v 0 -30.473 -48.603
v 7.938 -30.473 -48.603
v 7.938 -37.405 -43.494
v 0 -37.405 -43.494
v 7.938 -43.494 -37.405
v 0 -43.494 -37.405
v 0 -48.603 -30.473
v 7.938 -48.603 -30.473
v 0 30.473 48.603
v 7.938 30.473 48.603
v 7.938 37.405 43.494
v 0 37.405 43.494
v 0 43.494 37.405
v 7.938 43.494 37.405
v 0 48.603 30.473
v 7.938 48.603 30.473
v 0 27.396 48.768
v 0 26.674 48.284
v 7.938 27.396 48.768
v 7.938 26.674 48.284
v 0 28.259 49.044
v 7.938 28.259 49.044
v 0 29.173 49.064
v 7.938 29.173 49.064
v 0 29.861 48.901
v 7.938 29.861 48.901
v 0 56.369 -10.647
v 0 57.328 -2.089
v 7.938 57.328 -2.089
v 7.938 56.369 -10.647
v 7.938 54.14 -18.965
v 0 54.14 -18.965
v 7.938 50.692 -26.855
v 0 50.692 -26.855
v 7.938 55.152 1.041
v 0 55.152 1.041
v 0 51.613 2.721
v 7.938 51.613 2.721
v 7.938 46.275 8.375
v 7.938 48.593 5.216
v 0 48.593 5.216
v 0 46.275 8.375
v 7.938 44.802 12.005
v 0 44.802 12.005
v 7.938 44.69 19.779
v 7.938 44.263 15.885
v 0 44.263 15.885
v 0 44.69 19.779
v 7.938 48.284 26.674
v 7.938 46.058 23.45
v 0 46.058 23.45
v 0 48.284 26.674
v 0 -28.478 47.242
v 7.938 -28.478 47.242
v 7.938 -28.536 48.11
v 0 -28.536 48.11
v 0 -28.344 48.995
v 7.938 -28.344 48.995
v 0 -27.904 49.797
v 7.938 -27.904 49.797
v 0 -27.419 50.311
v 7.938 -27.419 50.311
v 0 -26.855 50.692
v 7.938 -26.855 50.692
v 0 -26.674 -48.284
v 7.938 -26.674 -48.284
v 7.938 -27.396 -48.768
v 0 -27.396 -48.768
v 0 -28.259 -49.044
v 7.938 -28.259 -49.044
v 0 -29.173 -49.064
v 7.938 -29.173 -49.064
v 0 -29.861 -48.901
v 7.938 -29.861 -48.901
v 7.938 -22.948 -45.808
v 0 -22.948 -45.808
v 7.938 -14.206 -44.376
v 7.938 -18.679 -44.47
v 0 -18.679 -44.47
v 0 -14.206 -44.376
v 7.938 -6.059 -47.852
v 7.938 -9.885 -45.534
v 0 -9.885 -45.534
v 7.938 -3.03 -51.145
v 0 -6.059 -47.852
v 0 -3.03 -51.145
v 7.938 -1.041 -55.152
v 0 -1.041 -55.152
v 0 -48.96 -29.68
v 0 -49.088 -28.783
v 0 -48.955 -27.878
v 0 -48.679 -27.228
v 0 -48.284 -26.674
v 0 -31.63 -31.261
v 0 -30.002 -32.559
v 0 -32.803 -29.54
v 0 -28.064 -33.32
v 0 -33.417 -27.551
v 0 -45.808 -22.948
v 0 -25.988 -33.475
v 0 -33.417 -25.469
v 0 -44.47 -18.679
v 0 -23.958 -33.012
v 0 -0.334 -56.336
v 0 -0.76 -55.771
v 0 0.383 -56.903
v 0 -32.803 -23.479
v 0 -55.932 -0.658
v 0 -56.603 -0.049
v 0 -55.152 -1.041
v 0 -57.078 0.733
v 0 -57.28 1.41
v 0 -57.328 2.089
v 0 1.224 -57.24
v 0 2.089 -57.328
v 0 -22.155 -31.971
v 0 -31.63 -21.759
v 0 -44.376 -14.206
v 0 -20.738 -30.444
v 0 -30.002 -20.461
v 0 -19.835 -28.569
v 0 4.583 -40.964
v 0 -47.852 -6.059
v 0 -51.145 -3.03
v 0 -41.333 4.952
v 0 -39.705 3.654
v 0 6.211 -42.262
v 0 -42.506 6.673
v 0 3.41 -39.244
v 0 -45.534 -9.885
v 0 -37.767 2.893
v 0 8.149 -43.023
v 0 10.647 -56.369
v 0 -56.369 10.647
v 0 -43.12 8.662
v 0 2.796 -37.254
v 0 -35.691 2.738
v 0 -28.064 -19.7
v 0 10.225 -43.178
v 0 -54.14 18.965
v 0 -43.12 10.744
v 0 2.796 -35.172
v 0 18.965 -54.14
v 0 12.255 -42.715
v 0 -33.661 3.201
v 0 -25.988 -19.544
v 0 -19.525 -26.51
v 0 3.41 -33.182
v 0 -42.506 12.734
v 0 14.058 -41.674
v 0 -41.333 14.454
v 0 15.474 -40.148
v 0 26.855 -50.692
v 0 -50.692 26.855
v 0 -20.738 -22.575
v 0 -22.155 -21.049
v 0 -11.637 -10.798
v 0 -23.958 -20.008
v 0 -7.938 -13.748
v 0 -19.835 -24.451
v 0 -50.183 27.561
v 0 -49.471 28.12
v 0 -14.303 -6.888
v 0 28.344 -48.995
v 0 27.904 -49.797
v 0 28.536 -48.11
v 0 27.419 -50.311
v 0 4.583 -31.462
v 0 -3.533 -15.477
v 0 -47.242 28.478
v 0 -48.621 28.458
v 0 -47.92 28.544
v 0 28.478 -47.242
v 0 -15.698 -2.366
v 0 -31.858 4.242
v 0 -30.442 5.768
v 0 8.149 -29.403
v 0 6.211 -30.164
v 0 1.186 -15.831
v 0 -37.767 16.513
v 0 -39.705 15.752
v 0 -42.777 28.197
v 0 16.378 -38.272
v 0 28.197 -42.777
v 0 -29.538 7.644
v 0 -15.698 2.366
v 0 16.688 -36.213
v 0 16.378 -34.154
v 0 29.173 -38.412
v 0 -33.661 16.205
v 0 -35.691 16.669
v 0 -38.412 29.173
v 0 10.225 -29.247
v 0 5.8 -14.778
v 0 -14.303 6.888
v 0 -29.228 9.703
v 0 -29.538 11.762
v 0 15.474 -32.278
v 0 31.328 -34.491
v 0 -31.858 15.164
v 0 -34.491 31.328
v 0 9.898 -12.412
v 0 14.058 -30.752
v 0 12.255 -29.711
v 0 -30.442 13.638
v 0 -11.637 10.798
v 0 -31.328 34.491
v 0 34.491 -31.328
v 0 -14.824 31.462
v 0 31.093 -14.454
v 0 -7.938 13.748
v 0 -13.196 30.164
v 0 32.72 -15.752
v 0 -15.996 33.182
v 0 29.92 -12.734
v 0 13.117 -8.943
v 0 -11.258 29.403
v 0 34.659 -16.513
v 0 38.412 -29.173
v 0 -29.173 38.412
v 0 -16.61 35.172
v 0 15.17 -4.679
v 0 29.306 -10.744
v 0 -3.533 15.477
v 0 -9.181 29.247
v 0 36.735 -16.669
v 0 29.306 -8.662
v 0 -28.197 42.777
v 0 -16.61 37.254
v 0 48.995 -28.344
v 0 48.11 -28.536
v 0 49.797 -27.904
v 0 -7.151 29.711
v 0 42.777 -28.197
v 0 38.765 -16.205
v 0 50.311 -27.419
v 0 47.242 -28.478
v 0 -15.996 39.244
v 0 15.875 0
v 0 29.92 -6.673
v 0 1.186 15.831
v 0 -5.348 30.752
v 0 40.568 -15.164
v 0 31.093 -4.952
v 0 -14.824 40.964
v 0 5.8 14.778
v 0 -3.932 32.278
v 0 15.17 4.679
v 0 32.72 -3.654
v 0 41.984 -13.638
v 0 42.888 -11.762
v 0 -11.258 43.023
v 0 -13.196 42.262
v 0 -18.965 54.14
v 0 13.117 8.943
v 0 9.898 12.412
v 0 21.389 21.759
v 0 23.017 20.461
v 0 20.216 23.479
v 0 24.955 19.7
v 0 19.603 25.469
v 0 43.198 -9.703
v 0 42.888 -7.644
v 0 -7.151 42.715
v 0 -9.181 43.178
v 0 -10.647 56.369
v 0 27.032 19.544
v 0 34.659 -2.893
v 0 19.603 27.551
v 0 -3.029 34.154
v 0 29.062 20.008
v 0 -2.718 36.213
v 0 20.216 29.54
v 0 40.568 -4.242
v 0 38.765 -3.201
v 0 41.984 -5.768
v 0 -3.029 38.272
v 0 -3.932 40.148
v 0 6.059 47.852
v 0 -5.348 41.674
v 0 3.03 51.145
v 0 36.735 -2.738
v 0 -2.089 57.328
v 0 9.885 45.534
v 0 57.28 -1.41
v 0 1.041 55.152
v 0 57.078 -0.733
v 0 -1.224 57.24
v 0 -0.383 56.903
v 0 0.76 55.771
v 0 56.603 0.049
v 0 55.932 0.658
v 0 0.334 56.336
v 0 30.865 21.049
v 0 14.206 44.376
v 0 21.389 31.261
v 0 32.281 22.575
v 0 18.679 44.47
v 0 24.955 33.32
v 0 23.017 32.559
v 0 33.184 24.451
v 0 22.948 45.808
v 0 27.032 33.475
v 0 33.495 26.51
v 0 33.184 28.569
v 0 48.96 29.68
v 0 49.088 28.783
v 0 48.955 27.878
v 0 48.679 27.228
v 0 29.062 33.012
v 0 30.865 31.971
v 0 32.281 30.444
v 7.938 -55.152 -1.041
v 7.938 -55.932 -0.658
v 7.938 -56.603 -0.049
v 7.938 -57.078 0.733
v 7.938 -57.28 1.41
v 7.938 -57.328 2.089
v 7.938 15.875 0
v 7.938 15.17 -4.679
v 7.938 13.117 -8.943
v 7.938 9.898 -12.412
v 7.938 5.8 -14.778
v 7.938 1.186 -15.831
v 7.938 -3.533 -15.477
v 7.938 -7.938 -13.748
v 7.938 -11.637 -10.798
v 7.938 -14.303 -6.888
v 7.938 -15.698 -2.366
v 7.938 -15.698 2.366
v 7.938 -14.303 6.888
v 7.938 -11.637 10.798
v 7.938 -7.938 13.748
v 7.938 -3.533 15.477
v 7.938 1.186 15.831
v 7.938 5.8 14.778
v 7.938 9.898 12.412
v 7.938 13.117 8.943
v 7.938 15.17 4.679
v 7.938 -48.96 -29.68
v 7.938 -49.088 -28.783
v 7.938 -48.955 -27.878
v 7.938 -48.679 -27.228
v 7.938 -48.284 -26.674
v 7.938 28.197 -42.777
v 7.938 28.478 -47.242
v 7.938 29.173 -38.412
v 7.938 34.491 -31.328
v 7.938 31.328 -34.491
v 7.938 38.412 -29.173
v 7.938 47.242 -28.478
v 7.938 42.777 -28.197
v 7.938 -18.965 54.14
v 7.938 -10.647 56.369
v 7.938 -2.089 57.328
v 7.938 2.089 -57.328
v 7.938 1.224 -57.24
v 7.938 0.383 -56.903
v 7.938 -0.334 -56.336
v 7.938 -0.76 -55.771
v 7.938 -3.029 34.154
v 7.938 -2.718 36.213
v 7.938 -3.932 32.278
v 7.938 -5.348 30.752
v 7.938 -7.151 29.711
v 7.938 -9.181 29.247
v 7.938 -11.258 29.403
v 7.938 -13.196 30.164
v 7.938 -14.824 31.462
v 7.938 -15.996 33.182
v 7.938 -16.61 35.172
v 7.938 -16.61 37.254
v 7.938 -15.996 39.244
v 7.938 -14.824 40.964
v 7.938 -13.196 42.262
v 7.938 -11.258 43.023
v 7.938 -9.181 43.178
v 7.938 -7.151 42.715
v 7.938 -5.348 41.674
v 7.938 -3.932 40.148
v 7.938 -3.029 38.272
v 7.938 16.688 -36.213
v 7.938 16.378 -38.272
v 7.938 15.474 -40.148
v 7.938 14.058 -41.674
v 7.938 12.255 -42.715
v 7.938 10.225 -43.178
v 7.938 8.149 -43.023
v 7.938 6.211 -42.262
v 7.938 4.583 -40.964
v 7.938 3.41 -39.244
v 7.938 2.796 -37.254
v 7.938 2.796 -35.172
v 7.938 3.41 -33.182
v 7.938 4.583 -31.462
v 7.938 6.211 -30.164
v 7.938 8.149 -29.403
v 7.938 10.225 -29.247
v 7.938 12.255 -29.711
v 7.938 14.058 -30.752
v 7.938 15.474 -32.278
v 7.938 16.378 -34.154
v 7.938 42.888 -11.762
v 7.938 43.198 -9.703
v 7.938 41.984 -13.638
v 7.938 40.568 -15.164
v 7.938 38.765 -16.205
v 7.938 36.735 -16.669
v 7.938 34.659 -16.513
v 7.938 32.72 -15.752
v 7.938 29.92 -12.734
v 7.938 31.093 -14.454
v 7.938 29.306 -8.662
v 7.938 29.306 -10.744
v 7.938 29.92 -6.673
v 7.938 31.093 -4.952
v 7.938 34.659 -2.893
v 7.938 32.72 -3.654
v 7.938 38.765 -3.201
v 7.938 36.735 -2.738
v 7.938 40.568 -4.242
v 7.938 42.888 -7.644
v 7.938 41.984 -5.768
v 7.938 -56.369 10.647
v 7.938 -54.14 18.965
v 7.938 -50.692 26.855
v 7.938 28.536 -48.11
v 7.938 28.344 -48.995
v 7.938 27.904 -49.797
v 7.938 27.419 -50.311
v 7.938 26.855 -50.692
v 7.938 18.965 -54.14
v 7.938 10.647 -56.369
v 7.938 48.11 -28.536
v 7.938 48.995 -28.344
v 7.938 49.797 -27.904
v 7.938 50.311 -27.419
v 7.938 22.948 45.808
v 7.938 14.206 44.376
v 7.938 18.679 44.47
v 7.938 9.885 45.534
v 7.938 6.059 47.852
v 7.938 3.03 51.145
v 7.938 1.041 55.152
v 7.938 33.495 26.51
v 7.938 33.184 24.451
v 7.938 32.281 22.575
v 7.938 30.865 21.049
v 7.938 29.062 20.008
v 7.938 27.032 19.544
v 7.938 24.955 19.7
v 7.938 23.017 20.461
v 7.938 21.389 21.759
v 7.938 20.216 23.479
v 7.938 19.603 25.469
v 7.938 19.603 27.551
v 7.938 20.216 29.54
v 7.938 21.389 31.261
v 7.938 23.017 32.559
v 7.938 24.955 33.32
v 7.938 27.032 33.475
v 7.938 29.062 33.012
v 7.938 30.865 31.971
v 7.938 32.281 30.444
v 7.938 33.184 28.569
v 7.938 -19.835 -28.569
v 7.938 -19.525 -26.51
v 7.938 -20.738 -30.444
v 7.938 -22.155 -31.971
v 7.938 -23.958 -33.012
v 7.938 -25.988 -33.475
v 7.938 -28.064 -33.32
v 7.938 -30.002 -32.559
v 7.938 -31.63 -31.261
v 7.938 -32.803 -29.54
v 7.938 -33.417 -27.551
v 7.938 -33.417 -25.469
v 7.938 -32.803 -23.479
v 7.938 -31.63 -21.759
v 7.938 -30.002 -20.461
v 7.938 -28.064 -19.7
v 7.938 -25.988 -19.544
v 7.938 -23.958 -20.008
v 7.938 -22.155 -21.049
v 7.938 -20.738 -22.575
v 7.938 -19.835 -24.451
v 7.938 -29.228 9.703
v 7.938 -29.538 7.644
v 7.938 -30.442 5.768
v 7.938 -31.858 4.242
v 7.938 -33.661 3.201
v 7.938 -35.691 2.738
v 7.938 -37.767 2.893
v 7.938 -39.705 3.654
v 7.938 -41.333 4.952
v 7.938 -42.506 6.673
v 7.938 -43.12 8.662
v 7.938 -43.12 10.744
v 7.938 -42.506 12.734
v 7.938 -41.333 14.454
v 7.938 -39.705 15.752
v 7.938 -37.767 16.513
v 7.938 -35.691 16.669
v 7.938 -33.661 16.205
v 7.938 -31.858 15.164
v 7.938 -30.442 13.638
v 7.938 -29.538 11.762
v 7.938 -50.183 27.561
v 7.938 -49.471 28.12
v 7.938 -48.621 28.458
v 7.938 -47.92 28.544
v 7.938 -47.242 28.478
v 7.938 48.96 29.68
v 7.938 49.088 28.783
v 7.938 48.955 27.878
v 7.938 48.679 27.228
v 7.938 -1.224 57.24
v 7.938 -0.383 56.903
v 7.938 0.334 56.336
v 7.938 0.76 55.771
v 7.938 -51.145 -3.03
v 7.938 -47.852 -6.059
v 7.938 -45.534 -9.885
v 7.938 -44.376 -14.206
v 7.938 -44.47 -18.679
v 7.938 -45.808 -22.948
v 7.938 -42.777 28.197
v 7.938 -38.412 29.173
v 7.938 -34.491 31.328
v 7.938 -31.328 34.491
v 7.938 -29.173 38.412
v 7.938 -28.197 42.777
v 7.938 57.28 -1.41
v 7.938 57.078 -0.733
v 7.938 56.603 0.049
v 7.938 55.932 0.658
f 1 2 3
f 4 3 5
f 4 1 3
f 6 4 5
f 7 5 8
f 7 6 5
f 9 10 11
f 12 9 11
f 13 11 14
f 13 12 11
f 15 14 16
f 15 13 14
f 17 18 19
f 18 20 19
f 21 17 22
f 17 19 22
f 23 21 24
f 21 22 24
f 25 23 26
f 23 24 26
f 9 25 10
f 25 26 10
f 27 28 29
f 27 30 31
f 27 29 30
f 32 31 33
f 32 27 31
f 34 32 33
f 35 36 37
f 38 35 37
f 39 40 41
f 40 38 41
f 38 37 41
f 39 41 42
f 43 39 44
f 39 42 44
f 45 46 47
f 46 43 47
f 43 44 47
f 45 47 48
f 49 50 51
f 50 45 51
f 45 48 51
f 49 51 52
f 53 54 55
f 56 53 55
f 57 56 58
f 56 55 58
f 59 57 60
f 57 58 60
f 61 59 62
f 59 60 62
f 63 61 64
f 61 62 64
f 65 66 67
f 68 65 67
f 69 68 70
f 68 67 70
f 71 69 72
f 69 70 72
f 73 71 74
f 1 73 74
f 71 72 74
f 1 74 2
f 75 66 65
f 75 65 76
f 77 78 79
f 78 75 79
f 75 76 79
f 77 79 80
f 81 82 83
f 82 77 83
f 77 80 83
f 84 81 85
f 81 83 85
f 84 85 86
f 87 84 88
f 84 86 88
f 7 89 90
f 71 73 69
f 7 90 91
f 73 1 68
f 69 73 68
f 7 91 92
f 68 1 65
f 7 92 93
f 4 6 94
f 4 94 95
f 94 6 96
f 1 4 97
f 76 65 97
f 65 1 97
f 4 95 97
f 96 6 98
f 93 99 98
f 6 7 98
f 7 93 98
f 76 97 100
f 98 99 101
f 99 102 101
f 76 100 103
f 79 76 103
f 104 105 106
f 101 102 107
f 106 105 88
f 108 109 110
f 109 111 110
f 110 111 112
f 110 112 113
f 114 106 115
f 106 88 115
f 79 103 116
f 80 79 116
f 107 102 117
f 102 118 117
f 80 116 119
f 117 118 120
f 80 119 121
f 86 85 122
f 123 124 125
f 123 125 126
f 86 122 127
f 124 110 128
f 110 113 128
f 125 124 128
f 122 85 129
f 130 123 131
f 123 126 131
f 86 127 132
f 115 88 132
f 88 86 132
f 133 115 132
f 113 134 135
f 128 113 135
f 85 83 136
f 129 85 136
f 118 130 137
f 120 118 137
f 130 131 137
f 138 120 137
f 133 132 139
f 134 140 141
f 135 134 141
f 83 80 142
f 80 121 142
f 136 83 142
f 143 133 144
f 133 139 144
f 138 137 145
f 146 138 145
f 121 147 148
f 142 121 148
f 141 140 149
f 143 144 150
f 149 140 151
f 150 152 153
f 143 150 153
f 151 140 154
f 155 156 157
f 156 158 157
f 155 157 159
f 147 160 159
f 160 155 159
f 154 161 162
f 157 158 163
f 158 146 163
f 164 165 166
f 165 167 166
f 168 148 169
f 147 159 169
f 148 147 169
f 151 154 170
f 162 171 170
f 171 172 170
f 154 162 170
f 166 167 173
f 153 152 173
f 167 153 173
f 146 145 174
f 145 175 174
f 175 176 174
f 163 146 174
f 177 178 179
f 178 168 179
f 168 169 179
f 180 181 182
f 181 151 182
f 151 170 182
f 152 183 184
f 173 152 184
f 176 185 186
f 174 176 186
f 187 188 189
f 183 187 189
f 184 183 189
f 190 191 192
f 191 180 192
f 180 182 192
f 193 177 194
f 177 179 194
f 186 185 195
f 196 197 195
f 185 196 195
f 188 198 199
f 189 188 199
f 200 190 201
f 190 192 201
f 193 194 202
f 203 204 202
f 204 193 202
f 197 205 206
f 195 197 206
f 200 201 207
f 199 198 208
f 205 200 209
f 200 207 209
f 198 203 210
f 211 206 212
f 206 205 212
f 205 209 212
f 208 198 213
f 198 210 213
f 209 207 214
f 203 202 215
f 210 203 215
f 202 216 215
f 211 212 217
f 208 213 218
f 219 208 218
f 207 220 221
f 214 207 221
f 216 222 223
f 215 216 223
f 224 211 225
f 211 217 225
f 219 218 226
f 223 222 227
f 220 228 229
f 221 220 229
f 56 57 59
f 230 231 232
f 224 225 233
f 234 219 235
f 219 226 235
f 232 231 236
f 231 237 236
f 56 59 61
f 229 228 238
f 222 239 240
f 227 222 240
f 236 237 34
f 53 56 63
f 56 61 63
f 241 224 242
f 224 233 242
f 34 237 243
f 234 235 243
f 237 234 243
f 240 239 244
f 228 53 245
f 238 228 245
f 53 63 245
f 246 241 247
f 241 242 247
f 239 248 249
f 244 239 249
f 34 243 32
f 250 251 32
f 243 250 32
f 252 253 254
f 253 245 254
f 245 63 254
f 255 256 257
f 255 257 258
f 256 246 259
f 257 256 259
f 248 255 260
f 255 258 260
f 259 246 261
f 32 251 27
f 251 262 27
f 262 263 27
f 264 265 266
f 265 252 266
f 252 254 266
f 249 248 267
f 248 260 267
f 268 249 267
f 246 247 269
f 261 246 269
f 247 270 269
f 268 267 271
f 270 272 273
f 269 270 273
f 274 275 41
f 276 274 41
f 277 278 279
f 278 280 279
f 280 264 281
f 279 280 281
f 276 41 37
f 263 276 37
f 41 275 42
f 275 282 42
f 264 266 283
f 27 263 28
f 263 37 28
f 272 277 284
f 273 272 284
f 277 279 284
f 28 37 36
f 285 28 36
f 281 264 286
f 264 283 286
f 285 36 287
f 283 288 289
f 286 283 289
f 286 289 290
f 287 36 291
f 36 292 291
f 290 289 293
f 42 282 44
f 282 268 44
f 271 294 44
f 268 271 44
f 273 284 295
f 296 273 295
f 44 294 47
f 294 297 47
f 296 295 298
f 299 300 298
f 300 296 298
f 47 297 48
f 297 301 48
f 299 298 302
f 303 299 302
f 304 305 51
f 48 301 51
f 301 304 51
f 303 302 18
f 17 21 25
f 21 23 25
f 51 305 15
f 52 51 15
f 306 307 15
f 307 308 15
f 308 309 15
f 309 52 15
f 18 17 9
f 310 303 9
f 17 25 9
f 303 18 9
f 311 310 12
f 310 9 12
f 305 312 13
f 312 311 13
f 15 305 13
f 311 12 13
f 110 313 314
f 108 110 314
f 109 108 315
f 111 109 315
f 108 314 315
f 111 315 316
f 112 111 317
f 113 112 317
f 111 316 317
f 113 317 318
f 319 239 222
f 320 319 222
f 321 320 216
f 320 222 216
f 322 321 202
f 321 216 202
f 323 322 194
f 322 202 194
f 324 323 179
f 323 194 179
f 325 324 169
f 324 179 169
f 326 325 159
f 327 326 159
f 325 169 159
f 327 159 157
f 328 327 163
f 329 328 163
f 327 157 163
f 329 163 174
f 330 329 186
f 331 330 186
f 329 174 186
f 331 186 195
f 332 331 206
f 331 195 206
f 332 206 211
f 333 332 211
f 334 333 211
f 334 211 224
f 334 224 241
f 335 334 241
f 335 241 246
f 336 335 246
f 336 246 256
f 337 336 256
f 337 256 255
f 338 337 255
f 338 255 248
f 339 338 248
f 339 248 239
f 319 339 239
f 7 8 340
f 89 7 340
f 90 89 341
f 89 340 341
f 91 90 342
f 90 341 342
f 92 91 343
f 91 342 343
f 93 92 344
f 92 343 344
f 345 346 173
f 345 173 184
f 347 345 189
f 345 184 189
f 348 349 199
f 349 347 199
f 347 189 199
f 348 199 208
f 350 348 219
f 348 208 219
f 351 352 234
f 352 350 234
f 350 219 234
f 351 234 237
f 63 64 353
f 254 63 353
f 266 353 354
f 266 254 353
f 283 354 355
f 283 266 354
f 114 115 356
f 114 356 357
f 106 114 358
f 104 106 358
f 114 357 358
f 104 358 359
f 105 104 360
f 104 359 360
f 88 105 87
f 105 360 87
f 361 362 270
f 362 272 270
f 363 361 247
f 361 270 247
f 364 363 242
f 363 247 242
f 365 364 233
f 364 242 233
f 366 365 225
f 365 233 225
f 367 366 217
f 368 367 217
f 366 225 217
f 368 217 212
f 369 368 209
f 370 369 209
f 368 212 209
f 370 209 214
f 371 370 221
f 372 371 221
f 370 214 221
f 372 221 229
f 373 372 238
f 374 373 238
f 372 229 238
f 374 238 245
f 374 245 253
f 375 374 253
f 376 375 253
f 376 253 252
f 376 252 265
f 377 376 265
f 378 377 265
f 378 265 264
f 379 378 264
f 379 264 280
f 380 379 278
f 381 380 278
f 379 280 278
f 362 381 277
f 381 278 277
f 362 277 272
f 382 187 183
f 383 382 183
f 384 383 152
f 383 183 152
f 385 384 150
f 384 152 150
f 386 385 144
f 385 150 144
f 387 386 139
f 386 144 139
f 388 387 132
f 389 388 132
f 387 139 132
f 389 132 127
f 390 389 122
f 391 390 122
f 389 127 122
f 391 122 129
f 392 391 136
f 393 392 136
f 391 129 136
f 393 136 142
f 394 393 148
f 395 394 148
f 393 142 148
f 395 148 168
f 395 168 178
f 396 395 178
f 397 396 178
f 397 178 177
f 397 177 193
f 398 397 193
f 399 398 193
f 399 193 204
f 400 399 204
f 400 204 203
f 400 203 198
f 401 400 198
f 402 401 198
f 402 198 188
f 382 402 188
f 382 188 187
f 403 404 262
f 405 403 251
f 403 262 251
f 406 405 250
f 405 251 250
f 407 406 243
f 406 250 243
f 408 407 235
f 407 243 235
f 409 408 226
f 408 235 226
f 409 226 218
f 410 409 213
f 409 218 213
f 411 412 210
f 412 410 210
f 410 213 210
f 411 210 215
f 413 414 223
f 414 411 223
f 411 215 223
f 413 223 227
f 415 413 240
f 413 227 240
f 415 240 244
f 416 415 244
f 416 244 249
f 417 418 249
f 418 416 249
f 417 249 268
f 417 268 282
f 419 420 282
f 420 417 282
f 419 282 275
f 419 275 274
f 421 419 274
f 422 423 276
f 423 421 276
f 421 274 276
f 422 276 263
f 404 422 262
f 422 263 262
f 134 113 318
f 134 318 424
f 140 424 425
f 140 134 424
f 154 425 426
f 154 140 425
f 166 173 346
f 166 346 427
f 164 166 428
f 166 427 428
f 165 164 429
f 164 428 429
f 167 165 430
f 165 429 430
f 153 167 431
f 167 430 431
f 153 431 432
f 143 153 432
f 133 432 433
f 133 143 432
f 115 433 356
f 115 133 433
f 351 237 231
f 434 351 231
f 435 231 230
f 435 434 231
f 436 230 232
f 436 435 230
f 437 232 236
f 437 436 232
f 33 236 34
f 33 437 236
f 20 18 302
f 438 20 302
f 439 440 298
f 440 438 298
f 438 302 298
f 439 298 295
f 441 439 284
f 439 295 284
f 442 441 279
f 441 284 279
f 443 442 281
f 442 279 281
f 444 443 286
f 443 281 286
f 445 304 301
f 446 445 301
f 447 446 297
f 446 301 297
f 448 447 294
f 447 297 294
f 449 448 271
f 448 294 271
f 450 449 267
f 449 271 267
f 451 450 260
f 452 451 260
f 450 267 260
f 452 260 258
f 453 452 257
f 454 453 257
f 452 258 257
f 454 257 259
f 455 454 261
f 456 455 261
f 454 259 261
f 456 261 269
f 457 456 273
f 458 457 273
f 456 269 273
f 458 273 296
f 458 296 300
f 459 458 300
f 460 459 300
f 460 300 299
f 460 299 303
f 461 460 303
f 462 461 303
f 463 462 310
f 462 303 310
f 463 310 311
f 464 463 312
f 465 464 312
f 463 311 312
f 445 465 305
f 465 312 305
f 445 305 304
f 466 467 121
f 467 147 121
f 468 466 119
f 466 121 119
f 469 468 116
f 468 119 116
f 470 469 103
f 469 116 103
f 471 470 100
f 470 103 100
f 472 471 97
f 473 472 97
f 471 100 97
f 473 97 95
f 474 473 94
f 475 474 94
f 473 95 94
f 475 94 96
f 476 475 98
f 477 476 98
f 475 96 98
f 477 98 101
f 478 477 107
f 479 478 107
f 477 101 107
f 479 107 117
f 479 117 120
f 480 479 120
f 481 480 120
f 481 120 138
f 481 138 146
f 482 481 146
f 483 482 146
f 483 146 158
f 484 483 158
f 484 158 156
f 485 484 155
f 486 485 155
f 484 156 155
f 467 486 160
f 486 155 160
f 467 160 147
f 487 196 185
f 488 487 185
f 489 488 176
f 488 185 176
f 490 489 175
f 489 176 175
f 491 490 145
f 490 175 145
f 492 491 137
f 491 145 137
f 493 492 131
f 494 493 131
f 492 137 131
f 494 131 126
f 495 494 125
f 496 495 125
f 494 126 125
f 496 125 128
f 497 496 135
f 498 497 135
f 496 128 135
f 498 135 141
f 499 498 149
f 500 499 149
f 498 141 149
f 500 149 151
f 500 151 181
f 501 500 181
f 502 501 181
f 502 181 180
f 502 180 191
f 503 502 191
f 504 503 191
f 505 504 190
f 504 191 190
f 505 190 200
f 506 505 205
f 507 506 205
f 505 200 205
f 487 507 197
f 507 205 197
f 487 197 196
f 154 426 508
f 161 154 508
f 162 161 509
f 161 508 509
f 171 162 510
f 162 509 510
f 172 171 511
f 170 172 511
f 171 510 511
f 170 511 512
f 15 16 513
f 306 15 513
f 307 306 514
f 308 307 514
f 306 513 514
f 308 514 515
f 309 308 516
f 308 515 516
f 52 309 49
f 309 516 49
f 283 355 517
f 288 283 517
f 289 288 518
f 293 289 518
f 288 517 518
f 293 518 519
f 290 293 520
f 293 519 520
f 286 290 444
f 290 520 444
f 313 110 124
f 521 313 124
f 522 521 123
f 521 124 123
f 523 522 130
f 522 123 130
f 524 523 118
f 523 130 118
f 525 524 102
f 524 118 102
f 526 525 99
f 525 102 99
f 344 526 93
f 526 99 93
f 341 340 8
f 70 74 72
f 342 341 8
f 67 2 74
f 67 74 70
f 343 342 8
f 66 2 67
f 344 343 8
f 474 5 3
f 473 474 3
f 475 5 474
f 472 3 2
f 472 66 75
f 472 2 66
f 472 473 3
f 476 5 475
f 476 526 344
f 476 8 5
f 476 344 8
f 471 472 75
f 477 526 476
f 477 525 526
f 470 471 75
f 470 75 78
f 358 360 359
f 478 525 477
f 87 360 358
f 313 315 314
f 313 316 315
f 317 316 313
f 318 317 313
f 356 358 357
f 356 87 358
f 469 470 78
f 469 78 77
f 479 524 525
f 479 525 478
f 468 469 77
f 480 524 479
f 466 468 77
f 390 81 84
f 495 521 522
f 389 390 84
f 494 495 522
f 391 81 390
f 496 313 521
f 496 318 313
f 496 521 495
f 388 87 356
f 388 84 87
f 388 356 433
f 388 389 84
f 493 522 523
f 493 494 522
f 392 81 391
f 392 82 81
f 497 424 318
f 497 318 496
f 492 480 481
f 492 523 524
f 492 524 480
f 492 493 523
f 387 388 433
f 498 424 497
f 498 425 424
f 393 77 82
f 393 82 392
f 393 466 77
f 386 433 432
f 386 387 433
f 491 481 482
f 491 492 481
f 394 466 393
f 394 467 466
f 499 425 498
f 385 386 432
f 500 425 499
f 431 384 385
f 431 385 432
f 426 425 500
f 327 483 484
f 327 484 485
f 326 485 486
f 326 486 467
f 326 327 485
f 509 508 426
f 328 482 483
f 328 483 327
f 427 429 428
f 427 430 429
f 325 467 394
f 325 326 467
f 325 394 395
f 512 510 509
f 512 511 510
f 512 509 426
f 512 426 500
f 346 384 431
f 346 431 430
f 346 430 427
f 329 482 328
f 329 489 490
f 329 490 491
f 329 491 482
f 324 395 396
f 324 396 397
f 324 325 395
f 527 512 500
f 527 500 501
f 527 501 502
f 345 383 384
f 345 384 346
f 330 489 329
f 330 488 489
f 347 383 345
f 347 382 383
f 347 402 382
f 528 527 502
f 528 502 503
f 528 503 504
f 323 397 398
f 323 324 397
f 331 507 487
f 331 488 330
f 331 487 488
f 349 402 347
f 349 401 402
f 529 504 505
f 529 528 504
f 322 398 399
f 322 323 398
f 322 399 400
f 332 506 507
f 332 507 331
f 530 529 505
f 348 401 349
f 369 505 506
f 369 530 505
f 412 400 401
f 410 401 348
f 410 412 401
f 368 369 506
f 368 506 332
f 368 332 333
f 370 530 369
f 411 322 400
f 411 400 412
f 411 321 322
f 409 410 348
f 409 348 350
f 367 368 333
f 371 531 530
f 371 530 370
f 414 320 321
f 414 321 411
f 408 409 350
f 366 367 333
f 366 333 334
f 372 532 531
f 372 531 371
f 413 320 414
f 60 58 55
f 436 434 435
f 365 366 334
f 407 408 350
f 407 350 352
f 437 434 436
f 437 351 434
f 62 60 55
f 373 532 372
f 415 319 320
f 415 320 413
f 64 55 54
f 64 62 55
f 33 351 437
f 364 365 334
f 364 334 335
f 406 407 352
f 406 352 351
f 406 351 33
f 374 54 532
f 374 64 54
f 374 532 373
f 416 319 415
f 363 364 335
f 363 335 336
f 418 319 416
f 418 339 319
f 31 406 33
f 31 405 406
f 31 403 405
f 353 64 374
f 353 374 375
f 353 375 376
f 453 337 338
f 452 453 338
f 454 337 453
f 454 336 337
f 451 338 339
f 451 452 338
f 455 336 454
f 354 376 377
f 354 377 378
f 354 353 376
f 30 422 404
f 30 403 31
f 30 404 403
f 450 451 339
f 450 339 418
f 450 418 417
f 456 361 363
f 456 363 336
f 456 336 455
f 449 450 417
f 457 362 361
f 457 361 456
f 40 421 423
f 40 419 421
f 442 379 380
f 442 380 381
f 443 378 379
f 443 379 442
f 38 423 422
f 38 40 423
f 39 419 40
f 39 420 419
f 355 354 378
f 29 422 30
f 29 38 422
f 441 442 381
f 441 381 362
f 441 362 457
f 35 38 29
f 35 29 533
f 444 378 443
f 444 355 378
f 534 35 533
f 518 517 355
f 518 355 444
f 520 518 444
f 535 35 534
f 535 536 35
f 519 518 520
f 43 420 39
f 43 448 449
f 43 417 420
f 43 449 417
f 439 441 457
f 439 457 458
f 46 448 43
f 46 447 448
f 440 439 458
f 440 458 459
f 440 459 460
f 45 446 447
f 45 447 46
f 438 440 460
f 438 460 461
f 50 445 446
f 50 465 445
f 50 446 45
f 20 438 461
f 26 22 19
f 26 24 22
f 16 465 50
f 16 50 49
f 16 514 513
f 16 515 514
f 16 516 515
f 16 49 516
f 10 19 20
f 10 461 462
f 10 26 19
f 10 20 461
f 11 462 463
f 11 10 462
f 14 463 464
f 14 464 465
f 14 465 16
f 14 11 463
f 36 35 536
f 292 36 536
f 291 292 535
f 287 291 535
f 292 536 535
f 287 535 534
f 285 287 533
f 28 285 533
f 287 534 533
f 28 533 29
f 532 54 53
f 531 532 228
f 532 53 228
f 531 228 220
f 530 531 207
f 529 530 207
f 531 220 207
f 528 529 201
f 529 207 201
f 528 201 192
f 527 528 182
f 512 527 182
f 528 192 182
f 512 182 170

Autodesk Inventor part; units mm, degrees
ref_plane "YZ Plane" through (0, 0, 0) normal (1, 0, 0) x (0, 1, 0)
ref_plane "XZ Plane" through (0, 0, 0) normal (0, 1, 0) x (-1, 0, 0)
ref_plane "XY Plane" through (0, 0, 0) normal (0, 0, 1) x (1, 0, 0)
sketch "Sketch1" plane through (0, 0, 0) normal (1, 0, 0) x (0, 1, 0)
  circle A0 centre (0, 0) radius 57.3659
  circle A1 centre (0, 0) radius 37.4904
  circle A2 centre (26.5097, 26.5097) radius 6.985
  line L0 (0, 0) -> (26.5097, 26.5097)
  line L1 (0, 0) -> (37.4904, 0) construction
  circle A3 centre (-9.7032, 36.2129) radius 6.985
  circle A4 centre (-36.2129, 9.7032) radius 6.985
  circle A5 centre (-26.5097, -26.5097) radius 6.985
  circle A6 centre (9.7032, -36.2129) radius 6.985
  circle A7 centre (36.2129, -9.7032) radius 6.985
  circle A8 centre (0, 0) radius 15.875
  circle A9 centre (60.1365, 16.1135) radius 15.875
  line L2 (0, 0) -> (62.2818, 0) construction
  line L3 (0, 0) -> (54.4204, 0) construction
  line L4 (0, 0) -> (47.0027, 0) construction
  line L5 (0, 0) -> (74.4134, 19.939)
  line L6 (0, 0) -> (77.0384, 0) construction
  circle A10 centre (0, 0) radius 15.875
  circle A11 centre (16.1135, 60.1365) radius 15.875
  circle A12 centre (0, 0) radius 15.875
  circle A13 centre (-44.023, 44.023) radius 15.875
  circle A14 centre (0, 0) radius 15.875
  circle A15 centre (-60.1365, -16.1135) radius 15.875
  circle A16 centre (0, 0) radius 15.875
  circle A17 centre (-16.1135, -60.1365) radius 15.875
  circle A18 centre (0, 0) radius 15.875
  circle A19 centre (44.023, -44.023) radius 15.875
  line L7 (0, 0) -> (-9.7032, 36.2129)
  line L8 (0, 0) -> (-36.2129, 9.7032)
  point P0 (36.2129, 9.7032)
  point P1 (49.9198, 28.264)
  point P2 (28.264, 49.9198)
  point P3 (0.4825, 57.3639)
  point P4 (-29.0998, 49.4373)
  point P5 (-49.4373, 29.0998)
  point P6 (-57.3639, -0.4825)
  point P7 (-49.9198, -28.264)
  point P8 (-28.264, -49.9198)
  point P9 (-0.4825, -57.3639)
  point P10 (29.0998, -49.4373)
  point P11 (49.4373, -29.0998)
  point P12 (57.3639, 0.4825)
  dimension "d0" = 114.7318
  dimension "d1" = 74.9808
  dimension "d2" = 13.97
  dimension "d3" = 45
  dimension "d6" = 360
  dimension "d8" = 31.75
  dimension "d12" = 31.75
  dimension "d16" = 15
  dimension "d19" = 360
  dimension "d24" = 21.6154
  dimension "d25" = 60.1365
extrude "Extrusion1" add sketch "Sketch1" along normal blind 7.9375 contours A1 A7 A6 A5 A4 L8 A8 L5 | L5 A8 L0 A2 A1 | A0 A19 A17 A15 A13 A11 A9 | L0 A8 L7 A3 A1 A2 | L8 A4 A1 A3 L7 A8
fillet "Fillet1" radius 3.175 12 edges at (3.9688, 57.3639, 0.4825) (3.9688, 49.9198, 28.264) (3.9688, 29.0998, -49.4373) (3.9688, 49.4373, -29.0998) (3.9688, -0.4825, -57.3639) (3.9688, -28.264, -49.9198) (3.9688, -49.9198, -28.264) (3.9688, -57.3639, -0.4825) (3.9688, -49.4373, 29.0998) (3.9688, -29.0998, 49.4373) (3.9688, 0.4825, 57.3639) (3.9688, 28.264, 49.9198)
properties part number "DTR-4"
